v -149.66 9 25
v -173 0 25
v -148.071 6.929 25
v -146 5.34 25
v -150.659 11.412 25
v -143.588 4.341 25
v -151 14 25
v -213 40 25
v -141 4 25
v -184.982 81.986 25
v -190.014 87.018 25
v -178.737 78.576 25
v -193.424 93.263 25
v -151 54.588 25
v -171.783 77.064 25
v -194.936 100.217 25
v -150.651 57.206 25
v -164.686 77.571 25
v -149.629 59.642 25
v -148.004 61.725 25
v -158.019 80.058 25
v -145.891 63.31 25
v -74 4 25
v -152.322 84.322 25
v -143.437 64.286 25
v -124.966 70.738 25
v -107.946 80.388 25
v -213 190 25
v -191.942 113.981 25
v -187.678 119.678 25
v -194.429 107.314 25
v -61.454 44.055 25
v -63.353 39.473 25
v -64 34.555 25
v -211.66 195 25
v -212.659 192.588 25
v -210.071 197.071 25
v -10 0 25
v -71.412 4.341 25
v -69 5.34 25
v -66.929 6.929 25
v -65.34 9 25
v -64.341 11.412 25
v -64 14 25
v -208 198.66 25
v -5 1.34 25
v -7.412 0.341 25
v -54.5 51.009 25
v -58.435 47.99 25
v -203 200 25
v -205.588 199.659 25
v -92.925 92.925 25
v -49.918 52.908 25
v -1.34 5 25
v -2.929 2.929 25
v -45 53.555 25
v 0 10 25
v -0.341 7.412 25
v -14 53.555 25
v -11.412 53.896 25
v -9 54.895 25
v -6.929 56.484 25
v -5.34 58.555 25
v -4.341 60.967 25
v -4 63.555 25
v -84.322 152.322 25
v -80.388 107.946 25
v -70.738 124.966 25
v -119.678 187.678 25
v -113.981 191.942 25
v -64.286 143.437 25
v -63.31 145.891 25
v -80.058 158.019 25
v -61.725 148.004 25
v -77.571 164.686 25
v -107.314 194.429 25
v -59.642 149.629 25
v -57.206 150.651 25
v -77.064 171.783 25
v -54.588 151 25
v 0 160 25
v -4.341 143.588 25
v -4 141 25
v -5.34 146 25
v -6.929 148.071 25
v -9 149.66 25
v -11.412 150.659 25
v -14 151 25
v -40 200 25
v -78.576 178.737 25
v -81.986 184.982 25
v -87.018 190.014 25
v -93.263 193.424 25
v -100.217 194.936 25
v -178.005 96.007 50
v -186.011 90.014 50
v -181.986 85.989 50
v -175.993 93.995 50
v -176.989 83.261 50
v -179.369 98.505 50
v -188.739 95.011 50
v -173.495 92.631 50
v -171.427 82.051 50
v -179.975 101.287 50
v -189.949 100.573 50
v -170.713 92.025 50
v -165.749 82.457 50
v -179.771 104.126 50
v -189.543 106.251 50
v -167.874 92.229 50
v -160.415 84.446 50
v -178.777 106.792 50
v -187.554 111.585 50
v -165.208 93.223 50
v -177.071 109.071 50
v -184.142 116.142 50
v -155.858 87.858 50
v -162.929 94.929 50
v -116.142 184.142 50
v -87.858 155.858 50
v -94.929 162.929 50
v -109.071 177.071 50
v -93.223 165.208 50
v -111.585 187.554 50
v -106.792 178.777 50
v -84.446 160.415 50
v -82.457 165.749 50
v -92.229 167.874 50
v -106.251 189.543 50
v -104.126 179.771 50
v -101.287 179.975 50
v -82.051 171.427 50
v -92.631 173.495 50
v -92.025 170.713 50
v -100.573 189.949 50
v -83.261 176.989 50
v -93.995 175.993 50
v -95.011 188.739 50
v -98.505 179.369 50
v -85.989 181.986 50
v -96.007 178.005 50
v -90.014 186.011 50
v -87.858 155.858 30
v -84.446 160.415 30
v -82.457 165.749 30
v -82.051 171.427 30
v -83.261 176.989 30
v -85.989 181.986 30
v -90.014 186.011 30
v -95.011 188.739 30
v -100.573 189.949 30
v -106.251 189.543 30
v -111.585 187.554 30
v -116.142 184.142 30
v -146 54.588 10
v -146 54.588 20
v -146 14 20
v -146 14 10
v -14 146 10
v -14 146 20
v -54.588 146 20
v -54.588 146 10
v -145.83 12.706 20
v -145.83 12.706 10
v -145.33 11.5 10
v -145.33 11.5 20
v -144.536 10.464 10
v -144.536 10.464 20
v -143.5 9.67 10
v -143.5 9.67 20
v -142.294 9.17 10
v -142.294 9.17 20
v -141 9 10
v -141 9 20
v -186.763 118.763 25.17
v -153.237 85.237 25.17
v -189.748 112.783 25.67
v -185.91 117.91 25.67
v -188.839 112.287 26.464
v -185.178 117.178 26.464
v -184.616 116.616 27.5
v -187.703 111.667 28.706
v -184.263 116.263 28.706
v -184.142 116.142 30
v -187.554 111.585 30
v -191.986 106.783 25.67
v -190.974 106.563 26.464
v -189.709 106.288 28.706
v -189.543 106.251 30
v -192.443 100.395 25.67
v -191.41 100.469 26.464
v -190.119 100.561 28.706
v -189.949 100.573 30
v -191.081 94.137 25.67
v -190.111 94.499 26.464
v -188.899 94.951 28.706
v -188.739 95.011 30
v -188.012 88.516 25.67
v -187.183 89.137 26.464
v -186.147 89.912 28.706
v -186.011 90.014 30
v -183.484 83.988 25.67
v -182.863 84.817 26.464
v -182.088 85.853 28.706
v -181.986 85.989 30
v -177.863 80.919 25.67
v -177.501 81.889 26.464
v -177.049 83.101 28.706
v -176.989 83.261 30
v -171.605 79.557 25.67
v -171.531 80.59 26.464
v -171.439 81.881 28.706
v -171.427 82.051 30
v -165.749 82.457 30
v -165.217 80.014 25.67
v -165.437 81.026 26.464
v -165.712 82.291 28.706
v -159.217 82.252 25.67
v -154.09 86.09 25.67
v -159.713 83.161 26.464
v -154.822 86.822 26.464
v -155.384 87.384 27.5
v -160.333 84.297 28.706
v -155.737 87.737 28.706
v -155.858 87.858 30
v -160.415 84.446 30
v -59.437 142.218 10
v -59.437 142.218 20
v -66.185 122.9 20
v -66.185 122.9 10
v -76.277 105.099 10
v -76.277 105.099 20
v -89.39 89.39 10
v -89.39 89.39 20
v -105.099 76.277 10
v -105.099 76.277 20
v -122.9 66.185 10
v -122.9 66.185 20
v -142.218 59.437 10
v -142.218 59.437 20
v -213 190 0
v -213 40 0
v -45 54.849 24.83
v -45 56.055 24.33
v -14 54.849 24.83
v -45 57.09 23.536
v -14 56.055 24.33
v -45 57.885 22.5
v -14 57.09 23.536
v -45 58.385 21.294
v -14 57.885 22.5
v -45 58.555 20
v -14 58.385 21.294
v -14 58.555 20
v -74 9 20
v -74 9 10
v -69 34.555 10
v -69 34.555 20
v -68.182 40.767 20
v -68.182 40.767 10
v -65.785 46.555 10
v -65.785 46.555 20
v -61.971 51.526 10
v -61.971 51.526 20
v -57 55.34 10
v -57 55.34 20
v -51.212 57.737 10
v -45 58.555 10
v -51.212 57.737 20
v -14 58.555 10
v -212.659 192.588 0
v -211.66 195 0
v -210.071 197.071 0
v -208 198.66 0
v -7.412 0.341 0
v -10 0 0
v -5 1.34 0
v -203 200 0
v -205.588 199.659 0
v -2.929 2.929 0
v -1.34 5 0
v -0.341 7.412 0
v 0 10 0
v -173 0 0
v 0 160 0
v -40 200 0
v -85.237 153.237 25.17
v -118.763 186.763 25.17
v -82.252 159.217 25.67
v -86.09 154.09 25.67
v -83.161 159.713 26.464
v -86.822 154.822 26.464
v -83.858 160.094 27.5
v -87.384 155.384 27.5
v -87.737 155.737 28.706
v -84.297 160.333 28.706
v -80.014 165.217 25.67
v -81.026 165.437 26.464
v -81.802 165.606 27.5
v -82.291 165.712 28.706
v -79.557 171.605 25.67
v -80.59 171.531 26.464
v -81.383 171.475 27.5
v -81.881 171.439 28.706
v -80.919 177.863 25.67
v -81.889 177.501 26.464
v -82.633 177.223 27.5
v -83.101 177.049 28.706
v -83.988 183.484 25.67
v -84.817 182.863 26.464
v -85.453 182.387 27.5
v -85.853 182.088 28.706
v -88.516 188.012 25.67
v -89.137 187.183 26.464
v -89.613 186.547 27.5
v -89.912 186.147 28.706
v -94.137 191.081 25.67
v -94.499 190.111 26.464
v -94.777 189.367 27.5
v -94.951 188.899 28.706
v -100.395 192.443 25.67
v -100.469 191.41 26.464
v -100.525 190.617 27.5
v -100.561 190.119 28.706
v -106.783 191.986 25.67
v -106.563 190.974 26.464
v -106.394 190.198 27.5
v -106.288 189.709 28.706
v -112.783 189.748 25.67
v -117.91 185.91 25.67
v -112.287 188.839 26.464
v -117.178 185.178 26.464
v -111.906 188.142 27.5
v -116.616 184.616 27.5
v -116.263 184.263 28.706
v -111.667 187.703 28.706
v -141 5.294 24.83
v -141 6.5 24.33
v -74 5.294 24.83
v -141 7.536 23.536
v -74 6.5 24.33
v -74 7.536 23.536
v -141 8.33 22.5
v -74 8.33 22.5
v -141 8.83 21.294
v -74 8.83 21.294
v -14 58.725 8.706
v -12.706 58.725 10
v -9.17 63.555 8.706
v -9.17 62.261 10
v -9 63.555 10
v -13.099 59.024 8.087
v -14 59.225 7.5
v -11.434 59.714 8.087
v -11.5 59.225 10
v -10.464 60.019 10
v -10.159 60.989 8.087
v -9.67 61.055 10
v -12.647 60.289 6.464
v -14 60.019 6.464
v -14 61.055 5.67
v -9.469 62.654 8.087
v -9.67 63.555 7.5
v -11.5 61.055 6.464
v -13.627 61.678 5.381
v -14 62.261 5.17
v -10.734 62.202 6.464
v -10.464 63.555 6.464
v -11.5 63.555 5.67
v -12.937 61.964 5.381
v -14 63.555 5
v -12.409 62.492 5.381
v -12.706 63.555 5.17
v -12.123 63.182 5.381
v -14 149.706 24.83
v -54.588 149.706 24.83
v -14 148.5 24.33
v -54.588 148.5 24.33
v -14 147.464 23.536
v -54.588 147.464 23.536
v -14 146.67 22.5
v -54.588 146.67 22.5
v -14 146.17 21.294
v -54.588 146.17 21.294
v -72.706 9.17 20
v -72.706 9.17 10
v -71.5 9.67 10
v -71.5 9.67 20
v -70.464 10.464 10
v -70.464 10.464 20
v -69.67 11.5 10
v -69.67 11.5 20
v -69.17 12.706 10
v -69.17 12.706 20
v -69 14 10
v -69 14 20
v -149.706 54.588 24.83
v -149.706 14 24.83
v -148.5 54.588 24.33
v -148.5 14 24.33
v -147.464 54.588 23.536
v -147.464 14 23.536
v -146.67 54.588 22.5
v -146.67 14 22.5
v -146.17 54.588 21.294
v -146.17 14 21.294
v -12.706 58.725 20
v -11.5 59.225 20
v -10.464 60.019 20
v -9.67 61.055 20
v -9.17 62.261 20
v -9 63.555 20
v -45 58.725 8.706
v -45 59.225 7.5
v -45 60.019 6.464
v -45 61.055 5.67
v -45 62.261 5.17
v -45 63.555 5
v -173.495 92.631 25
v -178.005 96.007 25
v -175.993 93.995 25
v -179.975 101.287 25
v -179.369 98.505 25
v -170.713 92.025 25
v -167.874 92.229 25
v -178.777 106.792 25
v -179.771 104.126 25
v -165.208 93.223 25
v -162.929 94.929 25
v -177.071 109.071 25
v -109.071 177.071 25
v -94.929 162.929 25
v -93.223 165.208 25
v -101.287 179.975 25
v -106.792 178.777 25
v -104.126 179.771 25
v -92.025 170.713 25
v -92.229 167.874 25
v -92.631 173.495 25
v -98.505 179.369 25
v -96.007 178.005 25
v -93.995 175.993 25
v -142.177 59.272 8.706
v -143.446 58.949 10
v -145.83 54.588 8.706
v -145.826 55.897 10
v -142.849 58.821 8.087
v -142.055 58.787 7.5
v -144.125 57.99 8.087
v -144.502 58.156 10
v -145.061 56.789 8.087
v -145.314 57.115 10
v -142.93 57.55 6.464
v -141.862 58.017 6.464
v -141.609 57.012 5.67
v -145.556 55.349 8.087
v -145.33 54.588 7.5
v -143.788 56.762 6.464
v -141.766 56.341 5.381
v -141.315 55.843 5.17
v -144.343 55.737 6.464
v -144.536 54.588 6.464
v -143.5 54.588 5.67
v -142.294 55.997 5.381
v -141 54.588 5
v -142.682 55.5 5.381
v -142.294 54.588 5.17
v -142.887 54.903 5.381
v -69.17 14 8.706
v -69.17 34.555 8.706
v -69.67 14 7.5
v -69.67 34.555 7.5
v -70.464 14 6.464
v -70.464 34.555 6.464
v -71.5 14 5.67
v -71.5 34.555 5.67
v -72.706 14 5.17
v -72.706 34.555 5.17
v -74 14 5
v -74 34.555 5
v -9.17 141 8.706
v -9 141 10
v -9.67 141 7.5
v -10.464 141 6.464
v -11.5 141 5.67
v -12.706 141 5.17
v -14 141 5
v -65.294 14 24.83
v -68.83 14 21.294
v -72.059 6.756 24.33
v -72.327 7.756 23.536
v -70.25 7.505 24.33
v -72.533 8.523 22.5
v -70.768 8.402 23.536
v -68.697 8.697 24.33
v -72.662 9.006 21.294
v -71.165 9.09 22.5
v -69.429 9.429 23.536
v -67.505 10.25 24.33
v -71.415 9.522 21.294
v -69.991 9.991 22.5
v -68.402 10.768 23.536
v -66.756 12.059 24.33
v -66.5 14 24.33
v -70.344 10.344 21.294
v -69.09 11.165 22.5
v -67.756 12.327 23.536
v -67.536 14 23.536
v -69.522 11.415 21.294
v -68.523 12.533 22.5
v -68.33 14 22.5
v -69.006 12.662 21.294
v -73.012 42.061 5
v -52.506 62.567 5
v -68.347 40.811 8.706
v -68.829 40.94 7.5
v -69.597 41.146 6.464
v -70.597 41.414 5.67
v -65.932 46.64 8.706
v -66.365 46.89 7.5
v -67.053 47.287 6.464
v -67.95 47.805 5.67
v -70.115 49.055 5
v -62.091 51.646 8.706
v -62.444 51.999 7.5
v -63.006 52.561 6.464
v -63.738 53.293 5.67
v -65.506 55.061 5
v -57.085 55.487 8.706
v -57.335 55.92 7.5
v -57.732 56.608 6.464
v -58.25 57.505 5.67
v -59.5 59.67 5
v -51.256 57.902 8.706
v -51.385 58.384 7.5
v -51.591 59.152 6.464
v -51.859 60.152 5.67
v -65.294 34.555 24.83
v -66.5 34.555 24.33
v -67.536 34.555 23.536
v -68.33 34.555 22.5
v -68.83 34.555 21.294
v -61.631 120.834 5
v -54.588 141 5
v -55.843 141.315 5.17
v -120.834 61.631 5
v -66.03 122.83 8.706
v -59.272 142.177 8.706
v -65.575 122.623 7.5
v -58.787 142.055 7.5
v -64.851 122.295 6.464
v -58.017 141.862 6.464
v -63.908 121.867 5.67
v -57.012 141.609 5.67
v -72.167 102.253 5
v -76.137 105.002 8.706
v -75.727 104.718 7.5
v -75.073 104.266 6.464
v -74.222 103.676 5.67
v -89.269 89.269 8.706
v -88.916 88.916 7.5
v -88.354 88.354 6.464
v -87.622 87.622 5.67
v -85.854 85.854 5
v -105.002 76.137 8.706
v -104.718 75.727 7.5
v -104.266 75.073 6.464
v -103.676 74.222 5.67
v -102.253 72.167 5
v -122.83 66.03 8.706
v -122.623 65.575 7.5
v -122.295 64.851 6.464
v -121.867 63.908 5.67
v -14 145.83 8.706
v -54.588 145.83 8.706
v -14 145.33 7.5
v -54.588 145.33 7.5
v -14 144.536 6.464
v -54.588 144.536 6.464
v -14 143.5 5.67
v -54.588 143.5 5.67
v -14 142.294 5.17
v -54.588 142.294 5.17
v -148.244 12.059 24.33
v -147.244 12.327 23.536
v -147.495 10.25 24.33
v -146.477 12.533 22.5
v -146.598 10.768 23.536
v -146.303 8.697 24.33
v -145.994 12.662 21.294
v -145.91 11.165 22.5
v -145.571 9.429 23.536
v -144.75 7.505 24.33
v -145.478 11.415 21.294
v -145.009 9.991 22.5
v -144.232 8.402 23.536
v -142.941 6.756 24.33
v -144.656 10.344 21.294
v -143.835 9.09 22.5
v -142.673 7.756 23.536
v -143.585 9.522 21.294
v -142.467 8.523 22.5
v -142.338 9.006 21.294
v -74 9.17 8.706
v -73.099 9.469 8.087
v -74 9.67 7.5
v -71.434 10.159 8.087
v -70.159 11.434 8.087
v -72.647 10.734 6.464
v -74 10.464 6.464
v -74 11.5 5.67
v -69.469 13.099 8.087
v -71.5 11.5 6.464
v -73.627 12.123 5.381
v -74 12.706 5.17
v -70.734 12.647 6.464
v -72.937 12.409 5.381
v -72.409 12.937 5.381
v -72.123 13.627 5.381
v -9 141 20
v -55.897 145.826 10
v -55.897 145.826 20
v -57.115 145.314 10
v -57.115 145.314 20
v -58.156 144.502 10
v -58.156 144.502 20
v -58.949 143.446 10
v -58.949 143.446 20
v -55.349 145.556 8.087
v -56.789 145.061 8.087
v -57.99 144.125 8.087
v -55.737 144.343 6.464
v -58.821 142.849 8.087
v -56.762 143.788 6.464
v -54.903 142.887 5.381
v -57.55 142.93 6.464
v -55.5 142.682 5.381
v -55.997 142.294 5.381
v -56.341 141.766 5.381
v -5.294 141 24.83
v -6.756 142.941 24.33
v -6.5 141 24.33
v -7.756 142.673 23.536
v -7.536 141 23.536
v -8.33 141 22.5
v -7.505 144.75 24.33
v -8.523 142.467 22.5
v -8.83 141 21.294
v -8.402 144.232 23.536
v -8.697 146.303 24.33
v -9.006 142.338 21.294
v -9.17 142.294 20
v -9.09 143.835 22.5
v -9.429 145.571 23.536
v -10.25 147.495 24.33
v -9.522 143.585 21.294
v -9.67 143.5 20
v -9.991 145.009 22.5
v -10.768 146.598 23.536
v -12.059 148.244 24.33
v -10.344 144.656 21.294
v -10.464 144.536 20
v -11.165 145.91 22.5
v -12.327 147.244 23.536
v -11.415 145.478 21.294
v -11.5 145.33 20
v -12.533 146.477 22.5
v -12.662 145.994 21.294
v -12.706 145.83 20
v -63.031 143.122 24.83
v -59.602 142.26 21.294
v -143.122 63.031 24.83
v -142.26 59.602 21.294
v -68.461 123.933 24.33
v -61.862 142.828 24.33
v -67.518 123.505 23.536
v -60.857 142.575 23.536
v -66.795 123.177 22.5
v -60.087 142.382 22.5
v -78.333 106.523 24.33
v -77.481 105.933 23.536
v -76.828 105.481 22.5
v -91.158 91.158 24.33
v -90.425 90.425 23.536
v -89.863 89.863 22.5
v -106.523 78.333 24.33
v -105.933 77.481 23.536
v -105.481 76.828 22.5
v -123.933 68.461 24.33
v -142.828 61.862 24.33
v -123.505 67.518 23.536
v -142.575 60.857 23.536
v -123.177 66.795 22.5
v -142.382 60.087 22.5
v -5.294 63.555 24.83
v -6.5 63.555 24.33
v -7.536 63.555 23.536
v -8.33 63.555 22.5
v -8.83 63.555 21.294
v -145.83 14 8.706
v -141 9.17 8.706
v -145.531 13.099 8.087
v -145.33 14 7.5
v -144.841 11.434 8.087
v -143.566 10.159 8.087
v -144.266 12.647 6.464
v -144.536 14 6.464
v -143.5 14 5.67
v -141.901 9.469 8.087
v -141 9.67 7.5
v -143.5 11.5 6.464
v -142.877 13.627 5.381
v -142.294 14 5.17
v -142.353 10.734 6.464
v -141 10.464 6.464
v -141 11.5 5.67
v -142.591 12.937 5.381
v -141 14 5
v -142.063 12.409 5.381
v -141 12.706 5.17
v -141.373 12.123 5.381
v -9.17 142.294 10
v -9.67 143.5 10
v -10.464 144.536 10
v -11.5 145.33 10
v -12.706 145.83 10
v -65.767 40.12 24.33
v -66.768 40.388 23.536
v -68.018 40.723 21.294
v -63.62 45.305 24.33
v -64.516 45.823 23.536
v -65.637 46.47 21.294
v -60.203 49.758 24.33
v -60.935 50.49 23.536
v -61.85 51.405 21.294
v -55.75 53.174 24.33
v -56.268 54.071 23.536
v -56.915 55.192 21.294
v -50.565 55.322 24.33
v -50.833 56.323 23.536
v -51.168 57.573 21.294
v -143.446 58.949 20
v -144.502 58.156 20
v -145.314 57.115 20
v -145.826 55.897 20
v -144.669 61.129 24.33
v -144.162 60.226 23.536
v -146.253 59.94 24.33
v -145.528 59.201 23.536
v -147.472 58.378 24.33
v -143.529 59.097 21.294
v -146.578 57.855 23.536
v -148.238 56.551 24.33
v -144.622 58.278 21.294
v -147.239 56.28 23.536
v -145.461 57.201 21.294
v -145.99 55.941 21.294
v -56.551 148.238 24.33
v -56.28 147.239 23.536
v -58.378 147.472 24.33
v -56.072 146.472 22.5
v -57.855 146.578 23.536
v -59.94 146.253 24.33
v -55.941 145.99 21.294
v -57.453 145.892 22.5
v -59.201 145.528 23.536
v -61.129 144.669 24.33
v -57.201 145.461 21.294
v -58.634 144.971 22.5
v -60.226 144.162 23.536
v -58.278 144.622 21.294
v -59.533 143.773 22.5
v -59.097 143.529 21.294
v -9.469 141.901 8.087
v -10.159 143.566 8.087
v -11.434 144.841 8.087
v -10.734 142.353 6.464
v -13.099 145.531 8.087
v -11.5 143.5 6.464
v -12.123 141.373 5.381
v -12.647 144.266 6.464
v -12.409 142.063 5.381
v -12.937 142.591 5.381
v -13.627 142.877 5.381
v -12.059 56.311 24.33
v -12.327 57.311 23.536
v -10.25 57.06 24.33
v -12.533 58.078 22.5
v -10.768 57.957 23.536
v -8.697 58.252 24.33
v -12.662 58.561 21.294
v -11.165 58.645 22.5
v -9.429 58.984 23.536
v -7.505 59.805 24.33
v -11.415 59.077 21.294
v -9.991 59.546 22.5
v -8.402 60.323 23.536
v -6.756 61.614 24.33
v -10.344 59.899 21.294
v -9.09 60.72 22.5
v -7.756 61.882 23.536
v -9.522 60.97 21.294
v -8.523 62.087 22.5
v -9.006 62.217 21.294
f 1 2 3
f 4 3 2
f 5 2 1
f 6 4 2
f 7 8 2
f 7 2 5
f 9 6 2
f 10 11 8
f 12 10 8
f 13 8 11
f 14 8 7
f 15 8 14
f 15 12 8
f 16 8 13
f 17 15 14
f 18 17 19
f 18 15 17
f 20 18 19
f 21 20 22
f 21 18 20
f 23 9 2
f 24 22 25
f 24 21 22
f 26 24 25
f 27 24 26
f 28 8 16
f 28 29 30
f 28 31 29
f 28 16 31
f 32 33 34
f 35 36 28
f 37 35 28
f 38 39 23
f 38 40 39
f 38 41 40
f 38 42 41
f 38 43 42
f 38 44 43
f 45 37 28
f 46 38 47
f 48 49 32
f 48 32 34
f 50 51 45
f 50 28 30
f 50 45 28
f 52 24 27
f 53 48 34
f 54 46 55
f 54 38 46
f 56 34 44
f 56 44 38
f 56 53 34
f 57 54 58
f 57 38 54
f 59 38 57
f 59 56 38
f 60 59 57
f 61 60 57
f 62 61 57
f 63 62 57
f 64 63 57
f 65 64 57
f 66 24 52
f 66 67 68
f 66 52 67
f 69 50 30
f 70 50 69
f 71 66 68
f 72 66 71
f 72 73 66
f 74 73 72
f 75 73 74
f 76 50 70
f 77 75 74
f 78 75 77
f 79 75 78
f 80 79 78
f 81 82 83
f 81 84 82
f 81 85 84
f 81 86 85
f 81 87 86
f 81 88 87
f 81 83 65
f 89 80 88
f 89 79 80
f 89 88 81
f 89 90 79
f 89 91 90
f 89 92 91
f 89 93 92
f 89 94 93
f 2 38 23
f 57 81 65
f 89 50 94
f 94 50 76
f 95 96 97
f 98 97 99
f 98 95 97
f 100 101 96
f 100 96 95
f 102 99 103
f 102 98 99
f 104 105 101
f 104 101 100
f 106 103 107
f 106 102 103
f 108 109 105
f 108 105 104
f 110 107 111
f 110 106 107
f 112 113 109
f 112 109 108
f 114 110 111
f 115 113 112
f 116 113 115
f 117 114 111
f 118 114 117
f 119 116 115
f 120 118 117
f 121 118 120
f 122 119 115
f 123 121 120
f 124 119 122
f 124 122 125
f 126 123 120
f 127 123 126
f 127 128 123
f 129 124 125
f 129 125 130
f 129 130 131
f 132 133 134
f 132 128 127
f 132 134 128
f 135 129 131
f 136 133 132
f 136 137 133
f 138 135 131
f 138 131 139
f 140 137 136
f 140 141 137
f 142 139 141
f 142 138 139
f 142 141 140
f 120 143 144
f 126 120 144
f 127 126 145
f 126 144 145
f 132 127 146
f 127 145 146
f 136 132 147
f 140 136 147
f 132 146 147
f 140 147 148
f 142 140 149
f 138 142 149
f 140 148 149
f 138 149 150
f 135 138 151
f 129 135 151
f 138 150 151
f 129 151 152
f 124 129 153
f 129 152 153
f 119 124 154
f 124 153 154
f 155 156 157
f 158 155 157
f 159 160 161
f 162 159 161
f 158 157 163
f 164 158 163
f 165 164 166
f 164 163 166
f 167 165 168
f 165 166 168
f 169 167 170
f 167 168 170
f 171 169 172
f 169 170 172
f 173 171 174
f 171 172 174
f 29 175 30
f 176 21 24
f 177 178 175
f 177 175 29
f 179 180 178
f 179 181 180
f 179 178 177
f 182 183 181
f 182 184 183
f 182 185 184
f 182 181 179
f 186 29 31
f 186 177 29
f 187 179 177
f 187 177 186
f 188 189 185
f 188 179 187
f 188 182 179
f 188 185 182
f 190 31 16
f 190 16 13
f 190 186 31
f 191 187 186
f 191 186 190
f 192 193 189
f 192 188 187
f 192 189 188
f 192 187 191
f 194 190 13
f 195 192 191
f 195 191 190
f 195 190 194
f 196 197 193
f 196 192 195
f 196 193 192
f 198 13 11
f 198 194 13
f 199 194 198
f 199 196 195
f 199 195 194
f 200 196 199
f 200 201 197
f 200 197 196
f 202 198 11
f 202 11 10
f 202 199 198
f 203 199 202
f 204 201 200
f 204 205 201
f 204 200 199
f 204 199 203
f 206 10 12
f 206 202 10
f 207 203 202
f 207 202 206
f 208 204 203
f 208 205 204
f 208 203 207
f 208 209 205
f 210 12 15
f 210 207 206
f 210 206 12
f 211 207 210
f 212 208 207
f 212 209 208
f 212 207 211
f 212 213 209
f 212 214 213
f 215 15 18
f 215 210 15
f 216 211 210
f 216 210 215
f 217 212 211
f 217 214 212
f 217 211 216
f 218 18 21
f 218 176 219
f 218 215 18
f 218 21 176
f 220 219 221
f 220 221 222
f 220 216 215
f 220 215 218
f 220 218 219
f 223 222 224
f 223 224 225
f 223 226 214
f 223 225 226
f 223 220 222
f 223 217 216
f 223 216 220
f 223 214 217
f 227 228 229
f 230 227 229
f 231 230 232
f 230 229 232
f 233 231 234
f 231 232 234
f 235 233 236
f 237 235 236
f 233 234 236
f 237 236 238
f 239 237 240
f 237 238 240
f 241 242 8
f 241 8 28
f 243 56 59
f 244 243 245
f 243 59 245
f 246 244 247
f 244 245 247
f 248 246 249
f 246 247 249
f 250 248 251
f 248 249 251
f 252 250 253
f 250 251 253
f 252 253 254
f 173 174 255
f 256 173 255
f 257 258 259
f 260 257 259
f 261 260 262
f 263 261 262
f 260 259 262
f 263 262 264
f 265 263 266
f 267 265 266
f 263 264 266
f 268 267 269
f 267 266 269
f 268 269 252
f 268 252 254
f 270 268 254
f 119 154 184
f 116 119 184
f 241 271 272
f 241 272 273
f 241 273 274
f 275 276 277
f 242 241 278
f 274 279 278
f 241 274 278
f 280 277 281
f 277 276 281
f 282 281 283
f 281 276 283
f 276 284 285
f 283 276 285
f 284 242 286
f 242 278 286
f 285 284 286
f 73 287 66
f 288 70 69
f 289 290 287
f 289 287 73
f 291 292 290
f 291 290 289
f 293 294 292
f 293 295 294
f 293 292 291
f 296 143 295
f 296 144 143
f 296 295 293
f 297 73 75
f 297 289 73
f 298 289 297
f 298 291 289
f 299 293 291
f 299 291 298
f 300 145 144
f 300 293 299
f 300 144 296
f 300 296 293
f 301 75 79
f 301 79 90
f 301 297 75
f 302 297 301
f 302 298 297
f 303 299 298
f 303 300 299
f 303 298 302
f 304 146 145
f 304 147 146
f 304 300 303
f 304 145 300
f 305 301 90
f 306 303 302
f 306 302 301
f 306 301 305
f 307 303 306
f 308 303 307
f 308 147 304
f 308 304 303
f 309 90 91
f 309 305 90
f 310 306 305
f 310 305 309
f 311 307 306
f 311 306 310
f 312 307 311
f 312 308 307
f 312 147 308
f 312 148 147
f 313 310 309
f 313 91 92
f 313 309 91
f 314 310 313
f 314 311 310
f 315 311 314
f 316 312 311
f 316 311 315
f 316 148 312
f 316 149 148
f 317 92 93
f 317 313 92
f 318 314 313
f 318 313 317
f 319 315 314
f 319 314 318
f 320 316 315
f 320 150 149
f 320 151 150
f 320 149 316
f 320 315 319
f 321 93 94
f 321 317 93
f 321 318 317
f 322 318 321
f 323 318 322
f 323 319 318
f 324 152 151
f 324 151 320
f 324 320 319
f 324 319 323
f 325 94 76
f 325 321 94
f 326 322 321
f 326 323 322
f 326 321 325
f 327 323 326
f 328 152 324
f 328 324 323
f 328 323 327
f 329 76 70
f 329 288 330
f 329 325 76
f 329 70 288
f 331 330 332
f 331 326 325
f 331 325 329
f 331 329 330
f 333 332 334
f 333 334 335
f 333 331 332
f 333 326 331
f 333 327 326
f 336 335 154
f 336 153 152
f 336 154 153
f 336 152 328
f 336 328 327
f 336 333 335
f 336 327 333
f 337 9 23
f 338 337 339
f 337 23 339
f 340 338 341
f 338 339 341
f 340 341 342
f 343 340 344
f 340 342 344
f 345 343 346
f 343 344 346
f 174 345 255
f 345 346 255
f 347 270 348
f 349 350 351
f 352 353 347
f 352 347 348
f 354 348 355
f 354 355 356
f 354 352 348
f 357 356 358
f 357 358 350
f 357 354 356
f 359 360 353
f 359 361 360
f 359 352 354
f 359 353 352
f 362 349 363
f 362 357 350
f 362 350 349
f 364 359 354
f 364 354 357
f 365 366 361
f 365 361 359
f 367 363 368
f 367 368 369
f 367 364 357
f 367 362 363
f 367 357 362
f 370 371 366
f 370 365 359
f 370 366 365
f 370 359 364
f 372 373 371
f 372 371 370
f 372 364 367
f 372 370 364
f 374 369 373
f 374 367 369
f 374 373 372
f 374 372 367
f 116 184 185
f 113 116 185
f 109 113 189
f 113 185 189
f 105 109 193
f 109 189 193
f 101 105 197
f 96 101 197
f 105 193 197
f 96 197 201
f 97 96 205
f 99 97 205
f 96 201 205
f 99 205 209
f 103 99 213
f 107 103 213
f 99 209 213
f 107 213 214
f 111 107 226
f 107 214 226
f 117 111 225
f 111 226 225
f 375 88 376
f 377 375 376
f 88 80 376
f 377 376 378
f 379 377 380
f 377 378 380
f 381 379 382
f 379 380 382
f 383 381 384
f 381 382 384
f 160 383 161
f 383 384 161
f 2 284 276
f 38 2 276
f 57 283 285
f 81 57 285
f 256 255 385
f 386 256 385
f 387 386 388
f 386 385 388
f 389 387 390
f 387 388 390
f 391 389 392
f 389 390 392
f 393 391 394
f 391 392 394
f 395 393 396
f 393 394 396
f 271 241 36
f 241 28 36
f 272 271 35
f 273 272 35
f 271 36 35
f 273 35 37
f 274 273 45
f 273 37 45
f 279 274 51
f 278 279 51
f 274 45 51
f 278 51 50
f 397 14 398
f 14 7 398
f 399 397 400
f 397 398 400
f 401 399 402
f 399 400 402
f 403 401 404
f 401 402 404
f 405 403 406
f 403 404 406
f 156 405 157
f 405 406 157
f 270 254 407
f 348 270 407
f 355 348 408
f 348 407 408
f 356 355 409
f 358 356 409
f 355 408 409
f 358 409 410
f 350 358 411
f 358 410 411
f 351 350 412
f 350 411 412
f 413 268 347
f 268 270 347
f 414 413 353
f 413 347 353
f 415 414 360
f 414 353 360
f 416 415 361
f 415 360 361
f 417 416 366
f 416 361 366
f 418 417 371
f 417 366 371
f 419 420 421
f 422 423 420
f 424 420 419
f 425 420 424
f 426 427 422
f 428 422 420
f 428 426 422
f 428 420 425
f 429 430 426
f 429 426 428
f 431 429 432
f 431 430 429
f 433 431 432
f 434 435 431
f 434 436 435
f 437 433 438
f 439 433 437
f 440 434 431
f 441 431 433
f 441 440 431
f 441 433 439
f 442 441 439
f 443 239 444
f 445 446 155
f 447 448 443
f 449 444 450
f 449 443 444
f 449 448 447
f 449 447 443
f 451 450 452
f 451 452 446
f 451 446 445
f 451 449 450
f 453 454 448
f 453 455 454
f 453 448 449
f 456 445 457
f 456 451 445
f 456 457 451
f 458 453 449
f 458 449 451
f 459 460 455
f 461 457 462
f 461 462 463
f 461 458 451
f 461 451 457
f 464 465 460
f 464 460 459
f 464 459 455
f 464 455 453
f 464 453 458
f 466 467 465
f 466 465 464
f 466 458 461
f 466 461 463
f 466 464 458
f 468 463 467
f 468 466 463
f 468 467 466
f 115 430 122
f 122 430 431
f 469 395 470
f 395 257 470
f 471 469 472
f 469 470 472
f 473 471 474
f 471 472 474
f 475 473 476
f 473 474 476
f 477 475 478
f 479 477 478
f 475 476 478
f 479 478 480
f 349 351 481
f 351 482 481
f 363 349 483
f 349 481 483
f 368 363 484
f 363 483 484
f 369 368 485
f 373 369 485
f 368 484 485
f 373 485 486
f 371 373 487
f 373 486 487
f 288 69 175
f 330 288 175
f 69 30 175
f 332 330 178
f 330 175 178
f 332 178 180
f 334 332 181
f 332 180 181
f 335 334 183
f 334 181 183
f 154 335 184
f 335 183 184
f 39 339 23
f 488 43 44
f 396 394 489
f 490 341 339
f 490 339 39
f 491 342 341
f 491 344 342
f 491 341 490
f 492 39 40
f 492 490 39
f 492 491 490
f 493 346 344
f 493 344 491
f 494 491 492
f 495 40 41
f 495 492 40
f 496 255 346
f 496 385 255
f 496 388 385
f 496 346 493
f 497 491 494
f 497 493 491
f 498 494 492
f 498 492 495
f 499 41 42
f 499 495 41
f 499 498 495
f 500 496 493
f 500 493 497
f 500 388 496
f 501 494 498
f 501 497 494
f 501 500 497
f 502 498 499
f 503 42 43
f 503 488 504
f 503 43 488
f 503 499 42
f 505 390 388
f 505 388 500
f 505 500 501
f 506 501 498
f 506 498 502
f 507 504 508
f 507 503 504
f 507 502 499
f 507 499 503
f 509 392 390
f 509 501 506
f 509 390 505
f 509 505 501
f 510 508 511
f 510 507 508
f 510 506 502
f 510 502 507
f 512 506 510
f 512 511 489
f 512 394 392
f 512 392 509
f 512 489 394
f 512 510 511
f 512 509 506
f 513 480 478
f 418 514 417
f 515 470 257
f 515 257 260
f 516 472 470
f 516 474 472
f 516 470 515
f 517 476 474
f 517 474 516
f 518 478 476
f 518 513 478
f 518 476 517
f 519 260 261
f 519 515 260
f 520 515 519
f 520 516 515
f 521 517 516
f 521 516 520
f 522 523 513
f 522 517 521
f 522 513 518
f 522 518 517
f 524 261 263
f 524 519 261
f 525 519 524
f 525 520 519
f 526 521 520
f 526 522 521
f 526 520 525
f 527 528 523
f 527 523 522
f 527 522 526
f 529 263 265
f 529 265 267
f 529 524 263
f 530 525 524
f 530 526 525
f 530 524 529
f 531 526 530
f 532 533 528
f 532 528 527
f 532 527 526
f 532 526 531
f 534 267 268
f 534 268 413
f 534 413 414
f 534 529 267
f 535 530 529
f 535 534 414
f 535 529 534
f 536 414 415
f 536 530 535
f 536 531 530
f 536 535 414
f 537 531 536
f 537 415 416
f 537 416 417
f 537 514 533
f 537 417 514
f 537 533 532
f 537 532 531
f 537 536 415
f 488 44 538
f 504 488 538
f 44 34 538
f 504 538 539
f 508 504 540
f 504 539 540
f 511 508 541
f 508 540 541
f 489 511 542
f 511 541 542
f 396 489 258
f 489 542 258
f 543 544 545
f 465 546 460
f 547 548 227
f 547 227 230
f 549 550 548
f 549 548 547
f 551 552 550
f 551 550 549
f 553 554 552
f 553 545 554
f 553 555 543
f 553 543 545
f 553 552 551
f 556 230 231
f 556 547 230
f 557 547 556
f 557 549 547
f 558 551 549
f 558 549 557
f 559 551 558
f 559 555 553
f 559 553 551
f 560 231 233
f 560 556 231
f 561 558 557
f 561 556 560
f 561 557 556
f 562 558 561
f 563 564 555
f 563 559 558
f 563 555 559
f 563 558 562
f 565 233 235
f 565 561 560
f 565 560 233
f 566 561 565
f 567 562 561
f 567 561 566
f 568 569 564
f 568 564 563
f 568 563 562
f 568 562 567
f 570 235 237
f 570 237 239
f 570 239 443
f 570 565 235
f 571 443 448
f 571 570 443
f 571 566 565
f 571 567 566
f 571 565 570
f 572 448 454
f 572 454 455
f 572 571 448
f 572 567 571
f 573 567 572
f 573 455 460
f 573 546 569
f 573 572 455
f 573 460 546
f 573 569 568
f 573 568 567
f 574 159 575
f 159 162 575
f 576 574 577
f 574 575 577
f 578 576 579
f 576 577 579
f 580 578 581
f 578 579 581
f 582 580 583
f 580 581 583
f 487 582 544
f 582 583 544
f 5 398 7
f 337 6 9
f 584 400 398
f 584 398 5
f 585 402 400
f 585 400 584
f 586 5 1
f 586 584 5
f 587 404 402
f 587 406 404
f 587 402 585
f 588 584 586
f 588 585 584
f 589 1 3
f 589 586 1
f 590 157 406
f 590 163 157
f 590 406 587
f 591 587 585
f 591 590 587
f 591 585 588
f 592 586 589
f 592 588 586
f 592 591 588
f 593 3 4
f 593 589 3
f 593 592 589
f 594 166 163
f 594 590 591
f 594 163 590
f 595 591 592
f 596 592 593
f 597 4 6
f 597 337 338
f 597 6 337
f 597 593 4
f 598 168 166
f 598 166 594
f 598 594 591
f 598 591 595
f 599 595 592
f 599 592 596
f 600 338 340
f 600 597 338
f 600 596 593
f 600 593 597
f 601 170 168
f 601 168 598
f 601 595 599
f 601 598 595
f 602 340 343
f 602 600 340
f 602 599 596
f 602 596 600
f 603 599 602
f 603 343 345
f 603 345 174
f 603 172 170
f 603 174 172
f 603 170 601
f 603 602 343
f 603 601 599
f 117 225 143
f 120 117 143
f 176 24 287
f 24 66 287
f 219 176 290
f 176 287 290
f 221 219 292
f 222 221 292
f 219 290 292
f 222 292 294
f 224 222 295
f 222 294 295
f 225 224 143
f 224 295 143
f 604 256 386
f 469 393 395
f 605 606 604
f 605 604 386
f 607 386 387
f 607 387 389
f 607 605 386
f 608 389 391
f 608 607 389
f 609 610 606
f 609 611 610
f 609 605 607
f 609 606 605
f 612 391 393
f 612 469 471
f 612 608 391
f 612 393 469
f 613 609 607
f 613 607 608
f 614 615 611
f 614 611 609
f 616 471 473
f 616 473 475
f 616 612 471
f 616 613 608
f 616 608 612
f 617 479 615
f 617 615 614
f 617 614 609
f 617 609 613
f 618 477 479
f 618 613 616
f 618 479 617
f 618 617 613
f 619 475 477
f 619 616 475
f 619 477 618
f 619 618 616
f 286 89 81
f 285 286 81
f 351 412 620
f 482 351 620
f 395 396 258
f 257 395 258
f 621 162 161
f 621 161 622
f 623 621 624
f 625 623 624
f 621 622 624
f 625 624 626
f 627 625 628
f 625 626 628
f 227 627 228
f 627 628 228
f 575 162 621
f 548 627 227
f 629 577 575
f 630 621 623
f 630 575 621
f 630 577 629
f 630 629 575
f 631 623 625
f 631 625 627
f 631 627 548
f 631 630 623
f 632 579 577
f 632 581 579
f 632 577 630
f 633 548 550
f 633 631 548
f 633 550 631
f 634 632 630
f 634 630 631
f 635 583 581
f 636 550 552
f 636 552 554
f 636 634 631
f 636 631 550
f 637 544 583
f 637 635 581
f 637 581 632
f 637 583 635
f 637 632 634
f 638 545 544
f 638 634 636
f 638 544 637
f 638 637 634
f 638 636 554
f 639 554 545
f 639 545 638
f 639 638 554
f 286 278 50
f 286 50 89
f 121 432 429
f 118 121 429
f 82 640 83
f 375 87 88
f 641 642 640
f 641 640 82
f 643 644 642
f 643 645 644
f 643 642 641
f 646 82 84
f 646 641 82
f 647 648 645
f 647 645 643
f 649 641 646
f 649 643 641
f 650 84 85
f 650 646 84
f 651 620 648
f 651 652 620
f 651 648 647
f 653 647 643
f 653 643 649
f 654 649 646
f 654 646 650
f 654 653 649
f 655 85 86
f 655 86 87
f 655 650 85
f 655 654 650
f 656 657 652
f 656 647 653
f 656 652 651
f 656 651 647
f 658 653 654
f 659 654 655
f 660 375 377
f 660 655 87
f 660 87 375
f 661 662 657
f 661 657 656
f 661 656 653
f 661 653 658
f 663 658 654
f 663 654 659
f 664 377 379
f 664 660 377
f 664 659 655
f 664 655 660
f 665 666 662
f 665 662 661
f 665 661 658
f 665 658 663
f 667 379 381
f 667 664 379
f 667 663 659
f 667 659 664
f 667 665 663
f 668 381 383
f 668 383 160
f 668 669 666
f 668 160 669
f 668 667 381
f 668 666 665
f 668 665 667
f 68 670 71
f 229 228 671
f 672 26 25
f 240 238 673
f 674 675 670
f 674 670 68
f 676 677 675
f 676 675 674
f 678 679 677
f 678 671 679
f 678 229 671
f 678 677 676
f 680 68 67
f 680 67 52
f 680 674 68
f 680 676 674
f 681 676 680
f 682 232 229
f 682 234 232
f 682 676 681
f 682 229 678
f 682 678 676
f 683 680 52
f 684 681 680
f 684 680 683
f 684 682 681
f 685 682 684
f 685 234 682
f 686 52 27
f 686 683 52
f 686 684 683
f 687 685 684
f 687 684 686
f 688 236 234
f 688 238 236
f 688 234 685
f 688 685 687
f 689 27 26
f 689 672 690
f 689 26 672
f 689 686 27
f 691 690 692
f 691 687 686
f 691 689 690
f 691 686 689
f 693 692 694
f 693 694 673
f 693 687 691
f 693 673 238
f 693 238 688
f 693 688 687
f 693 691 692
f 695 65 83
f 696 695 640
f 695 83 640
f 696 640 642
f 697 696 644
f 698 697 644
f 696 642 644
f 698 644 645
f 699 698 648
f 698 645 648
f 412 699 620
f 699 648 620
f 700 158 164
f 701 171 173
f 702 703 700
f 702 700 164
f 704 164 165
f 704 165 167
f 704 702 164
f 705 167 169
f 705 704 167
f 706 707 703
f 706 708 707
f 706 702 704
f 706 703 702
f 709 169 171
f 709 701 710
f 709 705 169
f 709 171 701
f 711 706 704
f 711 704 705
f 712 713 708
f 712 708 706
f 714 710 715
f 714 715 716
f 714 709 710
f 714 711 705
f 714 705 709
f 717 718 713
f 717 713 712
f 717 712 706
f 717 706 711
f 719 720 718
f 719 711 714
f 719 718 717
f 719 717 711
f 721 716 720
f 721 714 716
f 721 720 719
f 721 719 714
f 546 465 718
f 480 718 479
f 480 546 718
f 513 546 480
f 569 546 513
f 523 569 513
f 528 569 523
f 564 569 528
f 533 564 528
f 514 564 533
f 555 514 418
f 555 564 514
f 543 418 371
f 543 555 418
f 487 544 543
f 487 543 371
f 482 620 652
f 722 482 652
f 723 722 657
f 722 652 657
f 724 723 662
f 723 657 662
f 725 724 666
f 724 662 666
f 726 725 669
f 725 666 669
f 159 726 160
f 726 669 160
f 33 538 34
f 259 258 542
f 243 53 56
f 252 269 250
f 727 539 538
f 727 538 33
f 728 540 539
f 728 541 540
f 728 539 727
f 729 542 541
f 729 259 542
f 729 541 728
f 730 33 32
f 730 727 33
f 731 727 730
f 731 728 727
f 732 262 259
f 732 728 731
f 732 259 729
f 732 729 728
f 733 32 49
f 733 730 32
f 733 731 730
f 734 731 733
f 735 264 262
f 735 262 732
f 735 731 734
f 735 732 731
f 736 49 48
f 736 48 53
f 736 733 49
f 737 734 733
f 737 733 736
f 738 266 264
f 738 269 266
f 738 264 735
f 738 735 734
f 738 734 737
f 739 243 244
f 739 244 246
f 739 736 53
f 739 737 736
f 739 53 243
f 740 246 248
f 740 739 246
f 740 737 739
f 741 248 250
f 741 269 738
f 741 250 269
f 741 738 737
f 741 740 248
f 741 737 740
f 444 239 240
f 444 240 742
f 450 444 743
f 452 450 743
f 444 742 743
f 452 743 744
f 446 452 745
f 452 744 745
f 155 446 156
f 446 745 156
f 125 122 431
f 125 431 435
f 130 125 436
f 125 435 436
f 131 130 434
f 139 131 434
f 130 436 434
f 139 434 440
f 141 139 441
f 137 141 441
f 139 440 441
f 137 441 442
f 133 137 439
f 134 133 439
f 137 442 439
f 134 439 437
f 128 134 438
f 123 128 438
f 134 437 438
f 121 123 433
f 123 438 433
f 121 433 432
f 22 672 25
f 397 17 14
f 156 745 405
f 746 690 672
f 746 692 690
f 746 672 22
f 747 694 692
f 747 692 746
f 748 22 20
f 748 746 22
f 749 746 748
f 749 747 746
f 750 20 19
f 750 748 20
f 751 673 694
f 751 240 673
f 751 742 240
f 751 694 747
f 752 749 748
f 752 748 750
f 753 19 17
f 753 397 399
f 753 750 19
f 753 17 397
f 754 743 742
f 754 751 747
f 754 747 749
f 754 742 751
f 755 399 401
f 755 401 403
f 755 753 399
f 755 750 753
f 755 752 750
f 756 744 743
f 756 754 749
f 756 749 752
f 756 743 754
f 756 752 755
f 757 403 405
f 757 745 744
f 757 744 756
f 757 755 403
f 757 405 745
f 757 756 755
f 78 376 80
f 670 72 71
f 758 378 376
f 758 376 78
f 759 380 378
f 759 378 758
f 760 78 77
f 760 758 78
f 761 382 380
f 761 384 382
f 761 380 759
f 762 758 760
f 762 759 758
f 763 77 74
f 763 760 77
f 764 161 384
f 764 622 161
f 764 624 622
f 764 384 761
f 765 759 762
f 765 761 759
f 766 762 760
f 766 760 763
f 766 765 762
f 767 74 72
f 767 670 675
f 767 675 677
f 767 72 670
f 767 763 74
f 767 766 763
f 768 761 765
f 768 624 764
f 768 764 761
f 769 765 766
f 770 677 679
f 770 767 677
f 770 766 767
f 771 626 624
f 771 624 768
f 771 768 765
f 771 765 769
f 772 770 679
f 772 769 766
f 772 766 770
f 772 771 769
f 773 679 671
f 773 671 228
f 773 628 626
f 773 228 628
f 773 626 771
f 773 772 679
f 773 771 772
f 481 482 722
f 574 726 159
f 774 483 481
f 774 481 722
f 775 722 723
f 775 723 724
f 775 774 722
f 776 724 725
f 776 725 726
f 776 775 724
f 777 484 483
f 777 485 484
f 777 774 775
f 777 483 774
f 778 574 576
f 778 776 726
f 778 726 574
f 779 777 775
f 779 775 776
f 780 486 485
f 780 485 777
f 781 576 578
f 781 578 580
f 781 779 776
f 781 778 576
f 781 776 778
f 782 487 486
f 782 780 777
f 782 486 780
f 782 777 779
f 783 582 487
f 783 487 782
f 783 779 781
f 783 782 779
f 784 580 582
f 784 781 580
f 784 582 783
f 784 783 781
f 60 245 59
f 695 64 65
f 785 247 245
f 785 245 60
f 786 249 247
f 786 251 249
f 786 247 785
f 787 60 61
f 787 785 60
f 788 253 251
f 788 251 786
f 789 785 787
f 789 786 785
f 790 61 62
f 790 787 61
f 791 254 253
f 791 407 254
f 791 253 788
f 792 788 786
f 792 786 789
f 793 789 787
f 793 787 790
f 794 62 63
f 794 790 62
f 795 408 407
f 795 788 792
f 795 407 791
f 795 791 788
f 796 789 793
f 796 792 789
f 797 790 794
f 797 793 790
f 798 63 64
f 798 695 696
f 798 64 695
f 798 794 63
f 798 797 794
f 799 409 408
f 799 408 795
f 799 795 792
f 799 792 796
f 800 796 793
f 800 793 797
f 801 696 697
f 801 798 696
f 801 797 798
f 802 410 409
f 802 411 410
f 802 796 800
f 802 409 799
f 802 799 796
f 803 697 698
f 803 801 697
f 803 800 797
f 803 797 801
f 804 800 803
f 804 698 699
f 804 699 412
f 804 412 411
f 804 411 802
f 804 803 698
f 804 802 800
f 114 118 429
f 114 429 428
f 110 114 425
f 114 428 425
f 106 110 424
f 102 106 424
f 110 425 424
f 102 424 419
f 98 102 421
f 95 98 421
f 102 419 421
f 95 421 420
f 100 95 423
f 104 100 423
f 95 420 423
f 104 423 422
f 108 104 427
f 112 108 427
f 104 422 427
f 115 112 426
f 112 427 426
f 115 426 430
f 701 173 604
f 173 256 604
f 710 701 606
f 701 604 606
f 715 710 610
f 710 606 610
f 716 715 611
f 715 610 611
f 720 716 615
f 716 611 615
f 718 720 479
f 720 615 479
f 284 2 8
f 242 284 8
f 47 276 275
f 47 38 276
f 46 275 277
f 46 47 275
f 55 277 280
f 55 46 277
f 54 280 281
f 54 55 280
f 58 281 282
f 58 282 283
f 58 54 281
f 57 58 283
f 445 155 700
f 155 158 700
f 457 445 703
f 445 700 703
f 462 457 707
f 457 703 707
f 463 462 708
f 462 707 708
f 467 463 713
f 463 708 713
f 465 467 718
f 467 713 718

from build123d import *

# Parameters (mm, degrees)
F0_W     = 213
F0_H     = 200
F1_DEPTH = 25
F3_DEPTH = 50
F5_DEPTH = 25
F6_R     = 5
F7_DEPTH = 45
F8_R     = 5
F9_R     = 10


with BuildPart() as f1:
    # F0 (on Top) → F1 (new body)
    with BuildSketch(Plane.XY):
        with Locations((-106.5, 100)):
            Rectangle(F0_W, F0_H)
    extrude(amount=F1_DEPTH)

    # F2 (on face) → F3 (cut)
    with BuildSketch(Plane.XY.offset(25)):
        Polygon((0, 160), (0, 200), (-40, 200), align=None)
        Polygon((-213, 40), (-213, 0), (-173, 0), align=None)
    extrude(amount=-F3_DEPTH, mode=Mode.SUBTRACT)

    # F4 (on face) → F5 (join)
    with BuildSketch(Plane.XY.offset(25)):
        with BuildLine():
            ThreePointArc((-184.1421356237, 116.1421356237), (-184.1421356237, 87.8578643763), (-155.8578643763, 87.8578643763))
            Line((-155.8578643763, 87.8578643763), (-87.8578643763, 155.8578643763))
            ThreePointArc((-87.8578643763, 155.8578643763), (-87.8578643763, 184.1421356237), (-116.1421356237, 184.1421356237))
            Line((-116.1421356237, 184.1421356237), (-184.1421356237, 116.1421356237))
        make_face()
        with BuildLine():
            Line((-94.9289321881, 162.9289321881), (-162.9289321881, 94.9289321881))
            ThreePointArc((-162.9289321881, 94.9289321881), (-177.0710678119, 94.9289321881), (-177.0710678119, 109.0710678119))
            Line((-177.0710678119, 109.0710678119), (-109.0710678119, 177.0710678119))
            ThreePointArc((-109.0710678119, 177.0710678119), (-94.9289321881, 177.0710678119), (-94.9289321881, 162.9289321881))
        make_face(mode=Mode.SUBTRACT)
        with BuildLine():
            ThreePointArc((-59.4369521161, 142.218487395), (-89.3898269447, 89.3898269447), (-142.218487395, 59.4369521161))
            ThreePointArc((-142.218487395, 59.4369521161), (-144.9428693216, 57.6623958613), (-146, 54.58769563))
            Line((-146, 54.58769563), (-146, 14))
            ThreePointArc((-146, 14), (-144.5355339059, 10.4644660941), (-141, 9))
            Line((-141, 9), (-74, 9))
            ThreePointArc((-74, 9), (-70.4644660941, 10.4644660941), (-69, 14))
            Line((-69, 14), (-69, 34.554946274))
            ThreePointArc((-69, 34.554946274), (-61.9705627485, 51.5255090224), (-45, 58.554946274))
            Line((-45, 58.554946274), (-14, 58.554946274))
            ThreePointArc((-14, 58.554946274), (-10.4644660941, 60.019412368), (-9, 63.554946274))
            Line((-9, 63.554946274), (-9, 141))
            ThreePointArc((-9, 141), (-10.4644660941, 144.5355339059), (-14, 146))
            Line((-14, 146), (-54.58769563, 146))
            ThreePointArc((-54.58769563, 146), (-57.6623958613, 144.9428693216), (-59.4369521161, 142.218487395))
        make_face()
    extrude(amount=F5_DEPTH)

    # F6
    f6_edges = [f1.edges().sort_by_distance(p)[0] for p in [
        (-121.857864, 121.857864, 25),
    ]]
    fillet(f6_edges, radius=F6_R)

    # F7 (cut): a face of the model
    f7_faces = [f1.faces().sort_by_distance(p)[0] for p in [
        (-71.1078293712, 72.4638953315, 50),
    ]]
    extrude(f7_faces, amount=-F7_DEPTH, mode=Mode.SUBTRACT)

    # F8
    f8_edges = [f1.edges().sort_by_distance(p)[0] for p in [
        (-146, 34.293848, 25),
        (-89.389827, 89.389827, 5),
    ]]
    fillet(f8_edges, radius=F8_R)

    # F9
    f9_edges = [f1.edges().sort_by_distance(p)[0] for p in [
        (0, 0, 12.5),
        (-213, 200, 12.5),
    ]]
    fillet(f9_edges, radius=F9_R)


solid = f1.part
